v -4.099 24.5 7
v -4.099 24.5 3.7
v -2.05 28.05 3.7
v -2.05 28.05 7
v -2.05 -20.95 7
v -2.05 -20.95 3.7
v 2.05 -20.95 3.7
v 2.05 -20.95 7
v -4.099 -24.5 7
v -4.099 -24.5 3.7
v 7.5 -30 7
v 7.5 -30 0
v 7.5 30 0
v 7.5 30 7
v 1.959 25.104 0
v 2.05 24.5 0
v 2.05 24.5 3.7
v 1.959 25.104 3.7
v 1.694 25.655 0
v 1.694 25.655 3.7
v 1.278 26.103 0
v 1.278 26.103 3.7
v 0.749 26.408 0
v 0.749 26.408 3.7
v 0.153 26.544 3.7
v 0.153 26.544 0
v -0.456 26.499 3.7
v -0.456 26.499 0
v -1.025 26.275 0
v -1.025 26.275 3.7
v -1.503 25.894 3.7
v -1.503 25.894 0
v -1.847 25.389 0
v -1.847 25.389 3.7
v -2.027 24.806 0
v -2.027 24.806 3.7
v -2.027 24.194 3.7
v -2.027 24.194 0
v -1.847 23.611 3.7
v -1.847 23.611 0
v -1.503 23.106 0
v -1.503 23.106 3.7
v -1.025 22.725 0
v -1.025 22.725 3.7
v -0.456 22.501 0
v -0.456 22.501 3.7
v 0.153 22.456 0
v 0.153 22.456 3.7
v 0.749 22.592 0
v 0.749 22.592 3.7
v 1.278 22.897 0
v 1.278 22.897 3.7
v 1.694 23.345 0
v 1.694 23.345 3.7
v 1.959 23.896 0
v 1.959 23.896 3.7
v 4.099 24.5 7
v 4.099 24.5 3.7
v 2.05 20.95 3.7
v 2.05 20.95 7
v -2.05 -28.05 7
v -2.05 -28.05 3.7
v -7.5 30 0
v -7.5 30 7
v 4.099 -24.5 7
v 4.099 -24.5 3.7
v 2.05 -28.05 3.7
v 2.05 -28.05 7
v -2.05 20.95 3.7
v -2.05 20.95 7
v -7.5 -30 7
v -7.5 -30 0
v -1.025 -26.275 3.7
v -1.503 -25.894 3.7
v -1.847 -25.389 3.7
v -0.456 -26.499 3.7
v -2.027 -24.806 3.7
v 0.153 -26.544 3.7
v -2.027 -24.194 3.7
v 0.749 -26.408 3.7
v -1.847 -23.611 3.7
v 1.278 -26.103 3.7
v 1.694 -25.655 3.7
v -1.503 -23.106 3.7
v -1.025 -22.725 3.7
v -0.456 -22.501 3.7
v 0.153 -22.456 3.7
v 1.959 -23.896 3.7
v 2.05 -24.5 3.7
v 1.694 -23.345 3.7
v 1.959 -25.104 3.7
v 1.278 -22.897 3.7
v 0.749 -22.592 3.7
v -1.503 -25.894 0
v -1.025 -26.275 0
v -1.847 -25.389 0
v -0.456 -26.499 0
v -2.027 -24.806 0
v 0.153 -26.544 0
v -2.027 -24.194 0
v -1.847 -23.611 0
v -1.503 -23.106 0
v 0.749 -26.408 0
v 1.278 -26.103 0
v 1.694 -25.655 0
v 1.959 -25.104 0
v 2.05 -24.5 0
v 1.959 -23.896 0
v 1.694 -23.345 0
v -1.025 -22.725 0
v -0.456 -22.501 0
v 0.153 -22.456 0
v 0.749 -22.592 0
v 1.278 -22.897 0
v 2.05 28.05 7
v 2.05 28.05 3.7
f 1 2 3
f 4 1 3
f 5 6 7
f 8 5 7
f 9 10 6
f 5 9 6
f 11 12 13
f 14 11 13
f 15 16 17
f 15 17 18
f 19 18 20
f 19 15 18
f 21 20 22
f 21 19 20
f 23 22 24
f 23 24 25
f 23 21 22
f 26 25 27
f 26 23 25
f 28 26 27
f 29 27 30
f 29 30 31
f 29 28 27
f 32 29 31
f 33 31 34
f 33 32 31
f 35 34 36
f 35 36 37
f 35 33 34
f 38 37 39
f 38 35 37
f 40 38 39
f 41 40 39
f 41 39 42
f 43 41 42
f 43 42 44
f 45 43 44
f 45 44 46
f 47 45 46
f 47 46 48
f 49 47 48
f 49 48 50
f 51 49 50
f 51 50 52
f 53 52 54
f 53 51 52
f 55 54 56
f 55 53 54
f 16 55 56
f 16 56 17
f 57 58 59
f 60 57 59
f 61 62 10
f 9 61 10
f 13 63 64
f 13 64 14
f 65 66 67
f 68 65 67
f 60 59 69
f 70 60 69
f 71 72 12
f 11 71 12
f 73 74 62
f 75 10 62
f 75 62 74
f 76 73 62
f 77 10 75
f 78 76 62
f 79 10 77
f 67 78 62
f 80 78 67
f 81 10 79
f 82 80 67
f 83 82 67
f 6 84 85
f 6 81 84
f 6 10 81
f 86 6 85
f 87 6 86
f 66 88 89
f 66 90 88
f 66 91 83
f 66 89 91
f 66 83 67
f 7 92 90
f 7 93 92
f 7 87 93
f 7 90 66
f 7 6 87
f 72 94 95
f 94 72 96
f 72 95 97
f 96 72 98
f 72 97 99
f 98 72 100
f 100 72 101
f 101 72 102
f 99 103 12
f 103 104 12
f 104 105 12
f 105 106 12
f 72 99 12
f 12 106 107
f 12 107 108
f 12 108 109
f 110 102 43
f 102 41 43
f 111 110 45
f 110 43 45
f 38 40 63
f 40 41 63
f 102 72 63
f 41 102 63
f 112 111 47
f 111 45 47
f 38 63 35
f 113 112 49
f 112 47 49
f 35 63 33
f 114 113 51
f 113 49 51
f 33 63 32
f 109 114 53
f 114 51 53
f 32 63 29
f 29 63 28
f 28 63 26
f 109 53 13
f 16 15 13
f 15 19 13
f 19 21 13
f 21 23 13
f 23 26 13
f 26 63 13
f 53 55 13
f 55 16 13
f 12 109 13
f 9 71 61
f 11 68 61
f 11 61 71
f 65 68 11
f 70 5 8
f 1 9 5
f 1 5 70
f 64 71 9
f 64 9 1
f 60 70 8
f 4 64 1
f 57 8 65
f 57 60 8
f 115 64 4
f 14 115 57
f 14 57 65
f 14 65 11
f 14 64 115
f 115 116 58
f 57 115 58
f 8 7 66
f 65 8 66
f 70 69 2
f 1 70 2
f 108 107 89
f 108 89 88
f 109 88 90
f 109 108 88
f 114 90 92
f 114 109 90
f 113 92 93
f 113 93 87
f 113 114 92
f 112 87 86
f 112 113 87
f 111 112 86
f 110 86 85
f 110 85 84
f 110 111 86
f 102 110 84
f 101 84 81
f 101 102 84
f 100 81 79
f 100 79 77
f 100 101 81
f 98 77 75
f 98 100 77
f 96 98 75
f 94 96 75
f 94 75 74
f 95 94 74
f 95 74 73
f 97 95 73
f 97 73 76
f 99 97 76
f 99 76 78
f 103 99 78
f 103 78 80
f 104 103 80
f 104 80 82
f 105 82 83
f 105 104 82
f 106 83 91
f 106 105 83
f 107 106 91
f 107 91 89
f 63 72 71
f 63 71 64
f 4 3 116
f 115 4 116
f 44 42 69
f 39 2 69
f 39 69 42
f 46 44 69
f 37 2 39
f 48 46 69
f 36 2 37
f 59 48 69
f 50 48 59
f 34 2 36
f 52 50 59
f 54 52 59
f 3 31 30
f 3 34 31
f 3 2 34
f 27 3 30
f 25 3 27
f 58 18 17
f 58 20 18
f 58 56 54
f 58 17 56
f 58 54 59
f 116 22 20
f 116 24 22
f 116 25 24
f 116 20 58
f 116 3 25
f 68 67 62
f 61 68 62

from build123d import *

# Parameters (mm, degrees)
F0_W     = 15
F0_H     = 60
F1_DEPTH = 7
F0_R     = 2.05
F2_DEPTH = 3.7


with BuildPart() as f1:
    # F0 (on Top) → F1 (new body)
    with BuildSketch(Plane.XY):
        Rectangle(F0_W, F0_H)
        Polygon((-2.049593, -20.95), (2.049593, -20.95), (4.099187, -24.5), (2.049593, -28.05), (-2.049593, -28.05), (-4.099187, -24.5), align=None, mode=Mode.SUBTRACT)
        Polygon((4.099187, 24.5), (2.049593, 20.95), (-2.049593, 20.95), (-4.099187, 24.5), (-2.049593, 28.05), (2.049593, 28.05), align=None, mode=Mode.SUBTRACT)
    extrude(amount=F1_DEPTH)

    # F0 (on Top) → F2 (join)
    with BuildSketch(Plane.XY):
        Polygon((4.099187, -24.5), (2.049593, -20.95), (-2.049593, -20.95), (-4.099187, -24.5), (-2.049593, -28.05), (2.049593, -28.05), align=None)
        with Locations((0, -24.5)):
            Circle(F0_R, mode=Mode.SUBTRACT)
        Polygon((-2.049593, 20.95), (2.049593, 20.95), (4.099187, 24.5), (2.049593, 28.05), (-2.049593, 28.05), (-4.099187, 24.5), align=None)
        with Locations((0, 24.5)):
            Circle(F0_R, mode=Mode.SUBTRACT)
    extrude(amount=F2_DEPTH)


solid = f1.part
